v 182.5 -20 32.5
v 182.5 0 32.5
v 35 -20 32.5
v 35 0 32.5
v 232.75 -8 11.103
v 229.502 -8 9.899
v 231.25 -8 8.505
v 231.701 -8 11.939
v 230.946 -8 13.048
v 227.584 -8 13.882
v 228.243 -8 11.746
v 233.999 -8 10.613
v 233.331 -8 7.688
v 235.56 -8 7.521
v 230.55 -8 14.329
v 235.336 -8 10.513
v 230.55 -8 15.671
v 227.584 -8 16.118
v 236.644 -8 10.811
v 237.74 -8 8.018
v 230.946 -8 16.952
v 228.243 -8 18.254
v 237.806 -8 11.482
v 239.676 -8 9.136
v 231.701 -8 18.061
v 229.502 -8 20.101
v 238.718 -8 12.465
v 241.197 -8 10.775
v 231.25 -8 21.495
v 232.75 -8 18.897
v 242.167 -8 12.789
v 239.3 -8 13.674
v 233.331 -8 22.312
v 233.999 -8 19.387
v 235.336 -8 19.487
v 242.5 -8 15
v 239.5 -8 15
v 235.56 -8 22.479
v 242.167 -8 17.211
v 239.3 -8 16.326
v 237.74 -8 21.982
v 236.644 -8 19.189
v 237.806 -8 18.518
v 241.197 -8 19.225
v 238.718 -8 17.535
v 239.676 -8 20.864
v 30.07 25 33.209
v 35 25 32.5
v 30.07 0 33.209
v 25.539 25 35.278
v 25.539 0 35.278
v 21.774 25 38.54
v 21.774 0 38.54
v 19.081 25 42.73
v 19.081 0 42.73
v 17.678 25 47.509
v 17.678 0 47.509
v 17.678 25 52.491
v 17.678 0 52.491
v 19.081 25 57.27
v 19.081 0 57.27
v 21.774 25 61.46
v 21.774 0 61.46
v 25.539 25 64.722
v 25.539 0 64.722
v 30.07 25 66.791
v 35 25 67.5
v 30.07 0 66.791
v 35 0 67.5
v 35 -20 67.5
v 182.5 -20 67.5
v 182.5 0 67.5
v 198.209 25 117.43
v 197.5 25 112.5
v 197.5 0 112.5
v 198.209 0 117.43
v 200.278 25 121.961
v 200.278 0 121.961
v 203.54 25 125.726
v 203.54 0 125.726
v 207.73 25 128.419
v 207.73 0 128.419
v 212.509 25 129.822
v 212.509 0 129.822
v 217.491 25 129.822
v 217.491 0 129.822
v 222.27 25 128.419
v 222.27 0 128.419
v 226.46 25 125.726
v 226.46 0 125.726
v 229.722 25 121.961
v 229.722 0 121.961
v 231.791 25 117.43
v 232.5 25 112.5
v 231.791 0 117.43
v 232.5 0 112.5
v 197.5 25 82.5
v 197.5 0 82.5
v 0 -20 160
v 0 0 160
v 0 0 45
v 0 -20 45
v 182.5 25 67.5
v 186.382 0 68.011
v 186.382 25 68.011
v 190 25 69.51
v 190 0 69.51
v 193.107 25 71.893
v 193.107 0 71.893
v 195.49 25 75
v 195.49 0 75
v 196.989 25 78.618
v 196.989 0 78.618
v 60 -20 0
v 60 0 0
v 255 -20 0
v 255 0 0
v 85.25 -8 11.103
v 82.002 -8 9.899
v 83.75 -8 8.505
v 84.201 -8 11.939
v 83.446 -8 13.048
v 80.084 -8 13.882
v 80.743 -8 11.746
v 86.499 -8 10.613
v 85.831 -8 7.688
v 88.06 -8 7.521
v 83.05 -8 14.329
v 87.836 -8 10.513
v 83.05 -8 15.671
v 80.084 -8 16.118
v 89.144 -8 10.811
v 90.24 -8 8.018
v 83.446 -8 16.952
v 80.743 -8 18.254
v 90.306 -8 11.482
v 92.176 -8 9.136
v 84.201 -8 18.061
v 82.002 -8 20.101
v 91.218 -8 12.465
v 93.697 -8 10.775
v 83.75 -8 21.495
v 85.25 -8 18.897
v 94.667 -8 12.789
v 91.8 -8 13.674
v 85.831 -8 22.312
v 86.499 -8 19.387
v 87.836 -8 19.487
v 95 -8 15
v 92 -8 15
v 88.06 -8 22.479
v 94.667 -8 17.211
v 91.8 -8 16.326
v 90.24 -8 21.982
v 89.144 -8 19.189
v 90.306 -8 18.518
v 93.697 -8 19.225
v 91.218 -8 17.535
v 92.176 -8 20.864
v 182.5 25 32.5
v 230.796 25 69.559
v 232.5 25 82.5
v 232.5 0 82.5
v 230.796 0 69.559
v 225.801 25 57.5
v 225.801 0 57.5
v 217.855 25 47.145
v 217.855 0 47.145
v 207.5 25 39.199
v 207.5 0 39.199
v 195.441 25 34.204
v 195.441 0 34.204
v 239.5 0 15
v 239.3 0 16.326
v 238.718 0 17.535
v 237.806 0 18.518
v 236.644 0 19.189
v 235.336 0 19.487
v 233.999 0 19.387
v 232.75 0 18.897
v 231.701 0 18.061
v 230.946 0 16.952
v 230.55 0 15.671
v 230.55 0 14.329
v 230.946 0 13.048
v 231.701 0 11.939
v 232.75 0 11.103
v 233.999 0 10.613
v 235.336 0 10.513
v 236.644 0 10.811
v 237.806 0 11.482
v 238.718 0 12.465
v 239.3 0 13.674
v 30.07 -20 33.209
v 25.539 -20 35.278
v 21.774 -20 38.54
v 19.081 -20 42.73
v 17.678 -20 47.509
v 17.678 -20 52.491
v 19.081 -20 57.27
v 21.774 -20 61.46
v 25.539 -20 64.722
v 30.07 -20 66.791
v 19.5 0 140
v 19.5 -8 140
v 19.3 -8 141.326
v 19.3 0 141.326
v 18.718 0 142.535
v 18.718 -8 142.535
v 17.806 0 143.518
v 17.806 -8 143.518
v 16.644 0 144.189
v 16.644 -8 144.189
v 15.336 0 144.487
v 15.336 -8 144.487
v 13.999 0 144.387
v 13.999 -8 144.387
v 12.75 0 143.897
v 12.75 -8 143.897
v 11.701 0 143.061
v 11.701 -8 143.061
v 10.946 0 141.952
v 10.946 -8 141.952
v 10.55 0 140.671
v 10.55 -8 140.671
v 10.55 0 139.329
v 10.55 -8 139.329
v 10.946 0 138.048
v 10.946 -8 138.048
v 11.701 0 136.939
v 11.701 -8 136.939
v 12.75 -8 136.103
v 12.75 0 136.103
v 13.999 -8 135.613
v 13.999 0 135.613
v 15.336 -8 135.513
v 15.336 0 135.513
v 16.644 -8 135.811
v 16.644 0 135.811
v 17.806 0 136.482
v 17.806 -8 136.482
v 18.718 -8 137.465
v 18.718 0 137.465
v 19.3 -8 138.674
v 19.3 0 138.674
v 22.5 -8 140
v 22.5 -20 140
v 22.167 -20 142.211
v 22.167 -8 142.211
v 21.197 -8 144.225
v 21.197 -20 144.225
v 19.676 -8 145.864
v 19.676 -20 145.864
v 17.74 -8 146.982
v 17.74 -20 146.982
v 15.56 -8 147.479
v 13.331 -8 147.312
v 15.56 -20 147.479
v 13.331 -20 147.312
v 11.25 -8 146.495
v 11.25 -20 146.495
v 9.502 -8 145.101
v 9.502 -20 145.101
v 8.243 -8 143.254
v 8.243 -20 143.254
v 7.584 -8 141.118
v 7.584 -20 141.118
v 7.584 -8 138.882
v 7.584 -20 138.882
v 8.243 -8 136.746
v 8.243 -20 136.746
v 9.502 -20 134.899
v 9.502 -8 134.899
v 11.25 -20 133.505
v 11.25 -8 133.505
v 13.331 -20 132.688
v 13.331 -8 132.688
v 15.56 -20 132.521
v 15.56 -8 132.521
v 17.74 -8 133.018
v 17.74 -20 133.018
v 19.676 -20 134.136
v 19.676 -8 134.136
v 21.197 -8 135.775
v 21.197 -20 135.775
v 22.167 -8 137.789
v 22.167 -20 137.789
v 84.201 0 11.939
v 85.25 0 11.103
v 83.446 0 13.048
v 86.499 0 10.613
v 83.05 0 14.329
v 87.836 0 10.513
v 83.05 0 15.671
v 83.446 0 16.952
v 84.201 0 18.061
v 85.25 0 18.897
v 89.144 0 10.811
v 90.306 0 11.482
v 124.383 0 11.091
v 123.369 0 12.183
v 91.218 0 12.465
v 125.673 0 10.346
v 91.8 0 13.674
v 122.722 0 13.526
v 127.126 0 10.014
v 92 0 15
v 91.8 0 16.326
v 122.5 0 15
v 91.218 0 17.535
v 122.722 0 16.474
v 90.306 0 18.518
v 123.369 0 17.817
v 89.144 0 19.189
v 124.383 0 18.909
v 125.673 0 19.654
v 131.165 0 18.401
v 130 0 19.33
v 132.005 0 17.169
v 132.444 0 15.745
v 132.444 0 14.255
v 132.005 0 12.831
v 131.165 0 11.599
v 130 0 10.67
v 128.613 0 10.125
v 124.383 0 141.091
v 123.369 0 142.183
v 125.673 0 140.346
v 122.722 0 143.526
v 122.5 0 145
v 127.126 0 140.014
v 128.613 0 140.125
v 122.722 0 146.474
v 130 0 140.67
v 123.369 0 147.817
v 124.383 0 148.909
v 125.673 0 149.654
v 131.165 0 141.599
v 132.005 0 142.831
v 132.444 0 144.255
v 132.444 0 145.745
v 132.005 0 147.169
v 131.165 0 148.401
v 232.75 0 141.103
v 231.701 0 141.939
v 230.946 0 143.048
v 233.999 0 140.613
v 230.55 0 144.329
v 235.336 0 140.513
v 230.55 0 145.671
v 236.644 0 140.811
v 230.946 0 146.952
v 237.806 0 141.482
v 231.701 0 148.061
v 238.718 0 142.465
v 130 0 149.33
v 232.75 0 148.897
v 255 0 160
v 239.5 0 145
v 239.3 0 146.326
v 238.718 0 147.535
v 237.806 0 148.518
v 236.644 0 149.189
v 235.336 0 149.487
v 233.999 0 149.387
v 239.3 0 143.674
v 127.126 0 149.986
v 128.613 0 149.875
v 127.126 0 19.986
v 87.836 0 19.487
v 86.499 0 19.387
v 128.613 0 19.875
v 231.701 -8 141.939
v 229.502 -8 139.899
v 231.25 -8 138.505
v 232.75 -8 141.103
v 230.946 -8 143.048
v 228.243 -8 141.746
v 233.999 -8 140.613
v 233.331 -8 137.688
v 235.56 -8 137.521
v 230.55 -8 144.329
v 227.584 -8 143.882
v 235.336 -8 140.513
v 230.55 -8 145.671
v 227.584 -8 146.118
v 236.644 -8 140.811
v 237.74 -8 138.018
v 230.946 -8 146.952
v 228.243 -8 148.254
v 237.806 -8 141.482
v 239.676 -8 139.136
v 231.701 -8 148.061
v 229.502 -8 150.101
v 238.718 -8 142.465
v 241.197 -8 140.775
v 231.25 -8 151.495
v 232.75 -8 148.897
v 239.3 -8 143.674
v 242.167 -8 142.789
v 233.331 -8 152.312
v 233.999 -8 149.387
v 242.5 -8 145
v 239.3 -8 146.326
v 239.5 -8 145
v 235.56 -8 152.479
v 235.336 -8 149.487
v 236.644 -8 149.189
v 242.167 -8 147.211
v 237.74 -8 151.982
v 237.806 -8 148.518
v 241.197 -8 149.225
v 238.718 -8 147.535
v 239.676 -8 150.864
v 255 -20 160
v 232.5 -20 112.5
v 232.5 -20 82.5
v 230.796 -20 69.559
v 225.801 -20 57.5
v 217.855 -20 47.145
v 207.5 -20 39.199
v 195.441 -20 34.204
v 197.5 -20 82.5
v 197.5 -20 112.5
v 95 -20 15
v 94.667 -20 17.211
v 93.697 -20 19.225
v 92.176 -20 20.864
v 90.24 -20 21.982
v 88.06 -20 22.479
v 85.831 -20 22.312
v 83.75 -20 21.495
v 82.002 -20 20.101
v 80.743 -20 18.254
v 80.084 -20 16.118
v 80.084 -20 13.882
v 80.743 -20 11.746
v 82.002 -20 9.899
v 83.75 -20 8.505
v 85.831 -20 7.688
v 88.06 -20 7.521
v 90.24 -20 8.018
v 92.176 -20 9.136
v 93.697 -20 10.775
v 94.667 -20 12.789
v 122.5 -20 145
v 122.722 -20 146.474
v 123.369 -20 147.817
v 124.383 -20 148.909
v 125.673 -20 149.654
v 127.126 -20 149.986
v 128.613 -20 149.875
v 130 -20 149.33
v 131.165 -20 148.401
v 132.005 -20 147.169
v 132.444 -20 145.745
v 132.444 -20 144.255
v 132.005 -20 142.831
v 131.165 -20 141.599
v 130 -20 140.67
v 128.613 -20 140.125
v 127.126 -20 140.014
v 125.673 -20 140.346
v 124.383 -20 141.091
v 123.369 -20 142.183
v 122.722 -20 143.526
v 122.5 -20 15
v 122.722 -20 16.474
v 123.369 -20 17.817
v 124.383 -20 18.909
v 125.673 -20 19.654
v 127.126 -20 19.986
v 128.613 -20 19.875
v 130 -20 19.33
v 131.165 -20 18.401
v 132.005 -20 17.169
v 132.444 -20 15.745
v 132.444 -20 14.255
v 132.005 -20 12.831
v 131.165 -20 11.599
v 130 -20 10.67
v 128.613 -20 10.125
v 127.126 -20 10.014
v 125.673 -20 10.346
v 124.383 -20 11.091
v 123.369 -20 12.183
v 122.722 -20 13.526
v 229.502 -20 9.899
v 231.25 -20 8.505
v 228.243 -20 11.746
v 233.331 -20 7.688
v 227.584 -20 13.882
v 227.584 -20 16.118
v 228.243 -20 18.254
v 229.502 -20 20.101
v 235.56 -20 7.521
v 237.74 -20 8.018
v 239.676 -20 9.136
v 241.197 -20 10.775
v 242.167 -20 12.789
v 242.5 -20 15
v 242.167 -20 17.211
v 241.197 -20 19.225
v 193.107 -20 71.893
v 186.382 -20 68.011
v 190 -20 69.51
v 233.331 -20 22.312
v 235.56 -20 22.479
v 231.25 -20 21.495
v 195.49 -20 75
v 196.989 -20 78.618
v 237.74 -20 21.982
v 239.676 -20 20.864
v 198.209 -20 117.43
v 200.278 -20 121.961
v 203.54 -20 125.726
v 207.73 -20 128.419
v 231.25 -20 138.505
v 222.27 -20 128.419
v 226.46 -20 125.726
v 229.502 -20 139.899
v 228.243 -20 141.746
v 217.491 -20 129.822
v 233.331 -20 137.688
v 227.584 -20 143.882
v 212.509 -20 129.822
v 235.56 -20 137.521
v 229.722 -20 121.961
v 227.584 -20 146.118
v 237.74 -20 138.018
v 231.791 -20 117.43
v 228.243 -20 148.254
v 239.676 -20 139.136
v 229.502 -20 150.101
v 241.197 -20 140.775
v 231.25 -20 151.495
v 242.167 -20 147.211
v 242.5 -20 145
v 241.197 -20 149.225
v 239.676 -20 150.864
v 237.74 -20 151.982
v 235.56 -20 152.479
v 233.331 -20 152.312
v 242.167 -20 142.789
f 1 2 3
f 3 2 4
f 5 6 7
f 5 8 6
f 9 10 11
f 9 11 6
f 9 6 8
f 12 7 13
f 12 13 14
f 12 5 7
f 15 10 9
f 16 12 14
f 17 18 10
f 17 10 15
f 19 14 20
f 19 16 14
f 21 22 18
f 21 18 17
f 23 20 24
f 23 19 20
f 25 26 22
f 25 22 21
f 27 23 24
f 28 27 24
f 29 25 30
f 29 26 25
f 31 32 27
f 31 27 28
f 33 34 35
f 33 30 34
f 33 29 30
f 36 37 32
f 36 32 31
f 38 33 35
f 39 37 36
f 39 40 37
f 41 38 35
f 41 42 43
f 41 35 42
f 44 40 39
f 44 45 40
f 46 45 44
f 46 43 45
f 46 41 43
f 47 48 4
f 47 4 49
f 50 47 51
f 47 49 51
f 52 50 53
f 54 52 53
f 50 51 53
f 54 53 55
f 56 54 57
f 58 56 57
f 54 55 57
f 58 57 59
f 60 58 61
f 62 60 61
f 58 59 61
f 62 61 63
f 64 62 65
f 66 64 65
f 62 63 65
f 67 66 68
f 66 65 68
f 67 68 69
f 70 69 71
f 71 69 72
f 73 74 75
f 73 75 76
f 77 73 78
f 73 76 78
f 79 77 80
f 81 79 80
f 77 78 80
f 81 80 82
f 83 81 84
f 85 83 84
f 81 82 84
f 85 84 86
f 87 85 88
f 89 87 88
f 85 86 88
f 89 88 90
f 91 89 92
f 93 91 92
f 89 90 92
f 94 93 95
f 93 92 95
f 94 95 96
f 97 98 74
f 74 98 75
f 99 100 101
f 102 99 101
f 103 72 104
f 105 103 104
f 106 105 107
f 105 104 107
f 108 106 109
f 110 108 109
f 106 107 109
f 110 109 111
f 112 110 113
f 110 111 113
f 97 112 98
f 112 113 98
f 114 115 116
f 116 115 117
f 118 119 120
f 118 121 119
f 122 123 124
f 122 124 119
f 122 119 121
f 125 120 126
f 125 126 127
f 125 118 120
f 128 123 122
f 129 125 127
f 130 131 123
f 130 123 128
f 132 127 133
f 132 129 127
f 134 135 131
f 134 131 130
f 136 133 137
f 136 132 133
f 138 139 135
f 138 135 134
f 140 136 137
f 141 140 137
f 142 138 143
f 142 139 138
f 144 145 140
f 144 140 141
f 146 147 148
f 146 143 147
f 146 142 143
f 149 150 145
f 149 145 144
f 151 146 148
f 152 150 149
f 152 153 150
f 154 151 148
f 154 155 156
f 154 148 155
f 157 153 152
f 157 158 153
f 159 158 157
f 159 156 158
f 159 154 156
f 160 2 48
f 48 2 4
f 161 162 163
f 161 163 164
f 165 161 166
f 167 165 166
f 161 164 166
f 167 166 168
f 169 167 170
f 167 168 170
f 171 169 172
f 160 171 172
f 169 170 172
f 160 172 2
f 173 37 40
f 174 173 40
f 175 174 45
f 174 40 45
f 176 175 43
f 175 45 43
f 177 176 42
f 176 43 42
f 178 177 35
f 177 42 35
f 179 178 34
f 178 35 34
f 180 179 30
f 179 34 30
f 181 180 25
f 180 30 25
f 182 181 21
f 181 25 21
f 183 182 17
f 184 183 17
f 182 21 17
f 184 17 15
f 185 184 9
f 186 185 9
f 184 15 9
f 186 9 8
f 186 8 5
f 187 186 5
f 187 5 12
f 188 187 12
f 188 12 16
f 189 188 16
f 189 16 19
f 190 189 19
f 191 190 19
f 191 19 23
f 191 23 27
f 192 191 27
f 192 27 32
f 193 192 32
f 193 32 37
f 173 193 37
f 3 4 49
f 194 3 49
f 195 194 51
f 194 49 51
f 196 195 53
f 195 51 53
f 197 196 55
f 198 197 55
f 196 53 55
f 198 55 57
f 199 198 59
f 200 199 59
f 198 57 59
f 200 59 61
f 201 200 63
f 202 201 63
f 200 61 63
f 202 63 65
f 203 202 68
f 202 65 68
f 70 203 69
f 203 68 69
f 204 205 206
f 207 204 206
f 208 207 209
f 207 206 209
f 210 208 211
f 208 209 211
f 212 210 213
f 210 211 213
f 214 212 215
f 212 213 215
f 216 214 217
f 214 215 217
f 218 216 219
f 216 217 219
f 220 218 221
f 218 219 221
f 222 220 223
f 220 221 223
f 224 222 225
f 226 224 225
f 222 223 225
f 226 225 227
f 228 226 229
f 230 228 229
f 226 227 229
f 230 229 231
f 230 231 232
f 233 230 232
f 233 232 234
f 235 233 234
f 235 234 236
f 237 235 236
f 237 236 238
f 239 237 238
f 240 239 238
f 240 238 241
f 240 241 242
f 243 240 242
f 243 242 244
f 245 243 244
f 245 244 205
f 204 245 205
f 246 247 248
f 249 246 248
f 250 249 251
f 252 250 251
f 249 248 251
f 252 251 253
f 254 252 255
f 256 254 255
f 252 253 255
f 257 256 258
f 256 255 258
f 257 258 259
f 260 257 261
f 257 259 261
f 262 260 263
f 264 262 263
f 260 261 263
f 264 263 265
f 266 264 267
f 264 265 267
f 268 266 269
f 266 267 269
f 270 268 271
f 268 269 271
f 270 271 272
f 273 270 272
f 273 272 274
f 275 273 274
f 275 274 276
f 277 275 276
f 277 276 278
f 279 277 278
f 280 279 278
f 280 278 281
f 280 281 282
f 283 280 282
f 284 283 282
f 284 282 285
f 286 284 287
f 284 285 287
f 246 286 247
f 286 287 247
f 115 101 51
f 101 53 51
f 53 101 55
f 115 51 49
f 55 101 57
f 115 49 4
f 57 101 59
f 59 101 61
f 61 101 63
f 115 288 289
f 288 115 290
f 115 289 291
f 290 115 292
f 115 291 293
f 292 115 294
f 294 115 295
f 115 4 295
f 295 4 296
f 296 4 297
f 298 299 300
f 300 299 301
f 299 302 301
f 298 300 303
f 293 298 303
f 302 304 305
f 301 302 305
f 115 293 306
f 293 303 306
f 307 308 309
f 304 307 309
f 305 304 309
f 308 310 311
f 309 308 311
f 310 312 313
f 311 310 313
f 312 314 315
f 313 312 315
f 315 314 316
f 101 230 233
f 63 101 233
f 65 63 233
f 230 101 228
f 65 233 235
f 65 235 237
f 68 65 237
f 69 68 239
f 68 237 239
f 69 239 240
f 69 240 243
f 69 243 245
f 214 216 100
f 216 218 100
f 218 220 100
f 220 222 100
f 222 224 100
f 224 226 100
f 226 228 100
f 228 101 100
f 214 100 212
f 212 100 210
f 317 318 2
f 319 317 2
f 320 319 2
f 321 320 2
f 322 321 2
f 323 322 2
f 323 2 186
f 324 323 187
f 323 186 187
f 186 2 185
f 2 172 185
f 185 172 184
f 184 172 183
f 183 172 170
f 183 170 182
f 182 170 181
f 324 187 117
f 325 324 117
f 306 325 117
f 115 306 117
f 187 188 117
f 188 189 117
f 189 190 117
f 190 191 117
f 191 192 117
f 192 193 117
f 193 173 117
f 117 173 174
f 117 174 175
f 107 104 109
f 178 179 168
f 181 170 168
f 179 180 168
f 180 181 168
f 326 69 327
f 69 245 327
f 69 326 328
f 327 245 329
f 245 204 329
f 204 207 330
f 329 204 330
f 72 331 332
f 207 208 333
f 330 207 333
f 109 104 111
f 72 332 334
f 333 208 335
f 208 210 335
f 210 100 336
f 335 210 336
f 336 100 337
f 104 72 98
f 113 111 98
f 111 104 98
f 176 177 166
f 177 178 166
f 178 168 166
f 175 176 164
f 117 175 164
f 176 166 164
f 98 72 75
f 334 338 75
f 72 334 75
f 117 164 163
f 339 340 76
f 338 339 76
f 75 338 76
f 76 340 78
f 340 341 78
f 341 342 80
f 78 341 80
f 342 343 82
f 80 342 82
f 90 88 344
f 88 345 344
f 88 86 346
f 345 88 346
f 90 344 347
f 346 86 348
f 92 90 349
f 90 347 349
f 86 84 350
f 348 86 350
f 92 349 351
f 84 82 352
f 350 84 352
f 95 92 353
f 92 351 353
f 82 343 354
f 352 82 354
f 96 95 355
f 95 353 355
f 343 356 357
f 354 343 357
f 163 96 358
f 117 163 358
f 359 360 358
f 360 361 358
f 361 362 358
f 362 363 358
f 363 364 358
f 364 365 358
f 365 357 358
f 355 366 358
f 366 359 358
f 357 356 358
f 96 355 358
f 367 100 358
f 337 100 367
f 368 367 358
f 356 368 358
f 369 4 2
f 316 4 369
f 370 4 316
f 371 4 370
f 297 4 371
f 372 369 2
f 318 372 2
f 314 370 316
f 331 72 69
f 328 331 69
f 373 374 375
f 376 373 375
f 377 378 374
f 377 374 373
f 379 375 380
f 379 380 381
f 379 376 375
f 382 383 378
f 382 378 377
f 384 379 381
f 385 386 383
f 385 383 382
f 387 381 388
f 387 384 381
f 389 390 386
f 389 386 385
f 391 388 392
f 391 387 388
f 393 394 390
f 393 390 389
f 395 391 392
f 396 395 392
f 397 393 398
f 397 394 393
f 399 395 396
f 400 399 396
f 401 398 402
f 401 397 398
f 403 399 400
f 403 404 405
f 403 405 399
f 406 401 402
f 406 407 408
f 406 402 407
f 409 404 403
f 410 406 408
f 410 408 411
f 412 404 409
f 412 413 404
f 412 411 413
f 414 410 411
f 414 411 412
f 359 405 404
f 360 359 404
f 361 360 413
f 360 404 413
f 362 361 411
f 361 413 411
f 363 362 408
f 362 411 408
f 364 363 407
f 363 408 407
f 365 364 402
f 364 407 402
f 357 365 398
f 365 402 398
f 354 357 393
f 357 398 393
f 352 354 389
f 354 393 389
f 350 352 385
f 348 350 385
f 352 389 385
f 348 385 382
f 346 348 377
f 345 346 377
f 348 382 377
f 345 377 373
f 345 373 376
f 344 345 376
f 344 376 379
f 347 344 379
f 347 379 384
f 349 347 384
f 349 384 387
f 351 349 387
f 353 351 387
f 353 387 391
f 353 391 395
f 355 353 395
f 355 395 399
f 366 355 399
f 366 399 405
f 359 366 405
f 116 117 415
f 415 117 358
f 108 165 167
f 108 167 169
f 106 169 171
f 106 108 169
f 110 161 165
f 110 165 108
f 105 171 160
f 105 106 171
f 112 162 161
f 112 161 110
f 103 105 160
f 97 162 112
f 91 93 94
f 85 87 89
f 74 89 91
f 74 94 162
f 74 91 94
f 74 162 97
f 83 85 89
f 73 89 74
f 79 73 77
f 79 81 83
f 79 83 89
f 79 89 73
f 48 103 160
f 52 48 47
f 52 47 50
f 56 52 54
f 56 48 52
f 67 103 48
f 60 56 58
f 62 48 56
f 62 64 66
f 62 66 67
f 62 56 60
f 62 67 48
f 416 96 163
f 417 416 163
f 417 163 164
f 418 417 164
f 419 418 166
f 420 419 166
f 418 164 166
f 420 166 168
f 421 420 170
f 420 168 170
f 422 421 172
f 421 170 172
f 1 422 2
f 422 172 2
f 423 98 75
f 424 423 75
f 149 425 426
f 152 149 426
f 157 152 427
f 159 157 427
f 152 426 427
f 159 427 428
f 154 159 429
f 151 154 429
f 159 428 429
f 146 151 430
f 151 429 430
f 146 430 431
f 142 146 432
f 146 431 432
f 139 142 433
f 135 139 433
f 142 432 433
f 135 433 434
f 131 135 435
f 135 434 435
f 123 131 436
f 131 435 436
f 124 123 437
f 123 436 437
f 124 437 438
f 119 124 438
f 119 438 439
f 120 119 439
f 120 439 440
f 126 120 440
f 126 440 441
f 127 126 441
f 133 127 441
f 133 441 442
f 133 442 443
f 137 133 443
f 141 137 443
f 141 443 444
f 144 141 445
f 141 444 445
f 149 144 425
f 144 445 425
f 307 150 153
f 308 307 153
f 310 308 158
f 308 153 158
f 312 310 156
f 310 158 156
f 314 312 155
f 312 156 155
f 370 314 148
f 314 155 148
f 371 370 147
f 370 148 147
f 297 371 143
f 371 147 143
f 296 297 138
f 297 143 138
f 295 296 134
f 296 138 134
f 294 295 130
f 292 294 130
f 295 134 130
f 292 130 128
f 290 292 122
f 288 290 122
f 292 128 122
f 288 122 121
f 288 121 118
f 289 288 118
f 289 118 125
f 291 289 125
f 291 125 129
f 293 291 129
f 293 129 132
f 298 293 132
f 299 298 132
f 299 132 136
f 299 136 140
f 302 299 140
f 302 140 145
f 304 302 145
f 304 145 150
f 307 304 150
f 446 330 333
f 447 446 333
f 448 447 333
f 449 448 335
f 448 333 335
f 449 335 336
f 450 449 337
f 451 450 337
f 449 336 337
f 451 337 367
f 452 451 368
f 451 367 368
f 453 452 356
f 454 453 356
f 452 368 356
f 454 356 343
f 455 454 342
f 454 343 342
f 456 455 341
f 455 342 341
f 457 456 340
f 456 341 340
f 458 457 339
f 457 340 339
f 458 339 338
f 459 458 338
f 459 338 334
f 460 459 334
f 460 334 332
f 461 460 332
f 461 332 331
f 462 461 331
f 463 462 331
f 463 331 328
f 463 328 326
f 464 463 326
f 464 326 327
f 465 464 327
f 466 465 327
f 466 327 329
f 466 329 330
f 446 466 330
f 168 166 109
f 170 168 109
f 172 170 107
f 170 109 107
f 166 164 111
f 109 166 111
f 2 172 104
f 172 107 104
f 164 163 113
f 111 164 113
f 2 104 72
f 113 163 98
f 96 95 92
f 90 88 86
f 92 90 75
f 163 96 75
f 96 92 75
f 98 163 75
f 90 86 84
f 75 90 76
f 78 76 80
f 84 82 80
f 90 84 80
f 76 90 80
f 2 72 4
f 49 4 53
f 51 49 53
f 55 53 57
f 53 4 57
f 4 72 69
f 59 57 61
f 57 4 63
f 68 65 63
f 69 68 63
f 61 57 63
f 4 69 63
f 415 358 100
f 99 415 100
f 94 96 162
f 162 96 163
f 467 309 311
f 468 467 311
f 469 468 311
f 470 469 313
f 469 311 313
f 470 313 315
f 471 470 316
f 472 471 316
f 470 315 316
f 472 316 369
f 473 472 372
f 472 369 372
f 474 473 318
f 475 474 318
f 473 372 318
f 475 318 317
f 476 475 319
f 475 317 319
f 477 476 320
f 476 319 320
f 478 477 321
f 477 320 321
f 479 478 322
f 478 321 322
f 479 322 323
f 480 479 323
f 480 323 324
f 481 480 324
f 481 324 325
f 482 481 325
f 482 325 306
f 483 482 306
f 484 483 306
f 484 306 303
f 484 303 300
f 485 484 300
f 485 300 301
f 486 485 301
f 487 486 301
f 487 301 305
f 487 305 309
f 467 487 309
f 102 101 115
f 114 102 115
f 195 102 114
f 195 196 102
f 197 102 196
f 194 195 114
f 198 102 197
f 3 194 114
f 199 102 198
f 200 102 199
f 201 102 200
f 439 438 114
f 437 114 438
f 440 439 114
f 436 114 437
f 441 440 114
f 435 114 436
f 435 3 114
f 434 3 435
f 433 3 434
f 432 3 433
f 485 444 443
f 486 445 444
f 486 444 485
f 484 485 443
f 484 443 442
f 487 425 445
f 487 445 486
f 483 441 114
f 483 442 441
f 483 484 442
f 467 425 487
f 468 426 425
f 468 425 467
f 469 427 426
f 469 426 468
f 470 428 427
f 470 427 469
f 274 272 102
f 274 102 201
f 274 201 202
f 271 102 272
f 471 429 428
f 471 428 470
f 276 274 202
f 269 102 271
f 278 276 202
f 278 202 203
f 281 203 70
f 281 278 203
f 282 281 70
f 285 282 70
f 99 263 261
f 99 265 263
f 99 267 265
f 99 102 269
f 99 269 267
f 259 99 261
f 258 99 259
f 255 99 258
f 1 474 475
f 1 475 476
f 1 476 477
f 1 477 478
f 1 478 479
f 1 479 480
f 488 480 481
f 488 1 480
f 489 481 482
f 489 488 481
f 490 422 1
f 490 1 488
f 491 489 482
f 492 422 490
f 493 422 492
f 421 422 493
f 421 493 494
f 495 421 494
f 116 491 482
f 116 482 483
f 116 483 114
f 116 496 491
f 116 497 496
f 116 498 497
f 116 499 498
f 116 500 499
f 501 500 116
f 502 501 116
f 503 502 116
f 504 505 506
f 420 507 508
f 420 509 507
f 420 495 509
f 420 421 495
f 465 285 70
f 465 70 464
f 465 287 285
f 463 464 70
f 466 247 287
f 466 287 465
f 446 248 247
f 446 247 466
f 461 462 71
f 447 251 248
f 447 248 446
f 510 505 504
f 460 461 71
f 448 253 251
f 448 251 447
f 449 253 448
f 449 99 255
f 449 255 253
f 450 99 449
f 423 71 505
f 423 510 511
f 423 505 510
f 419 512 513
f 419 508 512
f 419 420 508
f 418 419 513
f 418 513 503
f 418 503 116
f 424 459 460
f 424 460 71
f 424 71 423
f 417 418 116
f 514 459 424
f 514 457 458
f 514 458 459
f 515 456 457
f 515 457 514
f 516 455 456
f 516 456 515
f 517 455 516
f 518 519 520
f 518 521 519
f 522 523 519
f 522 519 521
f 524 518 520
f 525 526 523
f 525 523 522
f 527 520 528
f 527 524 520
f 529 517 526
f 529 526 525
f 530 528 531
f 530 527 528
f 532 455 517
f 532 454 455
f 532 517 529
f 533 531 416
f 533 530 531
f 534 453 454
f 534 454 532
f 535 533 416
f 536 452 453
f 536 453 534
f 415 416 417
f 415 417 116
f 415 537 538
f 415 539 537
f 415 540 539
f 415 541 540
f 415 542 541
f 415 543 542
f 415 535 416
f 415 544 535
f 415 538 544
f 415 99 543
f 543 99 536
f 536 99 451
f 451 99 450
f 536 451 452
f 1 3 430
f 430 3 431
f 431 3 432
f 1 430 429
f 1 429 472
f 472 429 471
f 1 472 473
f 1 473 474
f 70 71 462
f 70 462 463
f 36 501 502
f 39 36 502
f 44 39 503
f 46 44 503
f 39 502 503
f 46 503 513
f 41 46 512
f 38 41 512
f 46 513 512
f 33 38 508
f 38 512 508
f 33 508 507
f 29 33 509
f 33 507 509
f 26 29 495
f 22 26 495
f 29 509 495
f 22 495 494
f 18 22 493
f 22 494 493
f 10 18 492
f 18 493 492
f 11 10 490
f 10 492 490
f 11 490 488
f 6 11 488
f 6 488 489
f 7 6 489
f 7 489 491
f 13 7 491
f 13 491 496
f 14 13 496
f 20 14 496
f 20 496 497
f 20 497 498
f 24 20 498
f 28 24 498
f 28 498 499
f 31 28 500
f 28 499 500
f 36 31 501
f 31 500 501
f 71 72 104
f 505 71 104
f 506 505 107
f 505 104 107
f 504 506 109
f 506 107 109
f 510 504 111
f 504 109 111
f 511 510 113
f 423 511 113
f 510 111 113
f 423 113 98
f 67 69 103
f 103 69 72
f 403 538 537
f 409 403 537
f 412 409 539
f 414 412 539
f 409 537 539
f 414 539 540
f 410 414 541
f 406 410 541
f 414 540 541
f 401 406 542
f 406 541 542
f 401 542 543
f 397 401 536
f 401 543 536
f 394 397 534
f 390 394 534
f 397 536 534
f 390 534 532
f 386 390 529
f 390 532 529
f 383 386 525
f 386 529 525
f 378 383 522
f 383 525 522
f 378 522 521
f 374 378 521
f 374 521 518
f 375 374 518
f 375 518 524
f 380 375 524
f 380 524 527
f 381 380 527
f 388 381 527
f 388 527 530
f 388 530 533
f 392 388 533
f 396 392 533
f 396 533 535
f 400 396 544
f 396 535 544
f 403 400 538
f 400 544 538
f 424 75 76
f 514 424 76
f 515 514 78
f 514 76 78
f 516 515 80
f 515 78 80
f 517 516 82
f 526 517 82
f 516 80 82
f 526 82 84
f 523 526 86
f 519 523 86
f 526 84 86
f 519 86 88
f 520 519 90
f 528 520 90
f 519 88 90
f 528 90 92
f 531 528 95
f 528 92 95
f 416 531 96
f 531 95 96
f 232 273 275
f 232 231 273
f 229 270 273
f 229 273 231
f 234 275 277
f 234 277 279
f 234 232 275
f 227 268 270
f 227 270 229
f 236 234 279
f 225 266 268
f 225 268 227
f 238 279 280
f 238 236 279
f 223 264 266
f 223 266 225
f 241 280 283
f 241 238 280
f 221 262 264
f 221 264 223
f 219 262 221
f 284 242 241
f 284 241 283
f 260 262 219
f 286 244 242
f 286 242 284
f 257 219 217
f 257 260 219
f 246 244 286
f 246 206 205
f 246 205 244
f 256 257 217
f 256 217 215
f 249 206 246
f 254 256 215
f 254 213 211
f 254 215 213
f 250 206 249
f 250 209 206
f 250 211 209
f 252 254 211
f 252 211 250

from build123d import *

# Parameters (mm, degrees)
F1_DEPTH = 20
F2_R     = 4.5
F3_DEPTH = 20.001
F2_R_2   = 7.5
F4_DEPTH = 12
F5_D     = 10
F7_DEPTH = 25


with BuildPart() as f1:
    # F0 (on Front) → F1 (new body)
    with BuildSketch(Plane.XZ):
        Polygon((0, 45), (60, 0), (255, 0), (255, 160), (0, 160), align=None)
        with BuildLine():
            ThreePointArc((35, 32.5), (17.5, 50), (35, 67.5))
            Line((35, 67.5), (182.5, 67.5))
            ThreePointArc((182.5, 67.5), (193.106602, 71.893398), (197.5, 82.5))
            Line((197.5, 82.5), (197.5, 112.5))
            ThreePointArc((197.5, 112.5), (215, 130), (232.5, 112.5))
            Line((232.5, 112.5), (232.5, 82.5))
            ThreePointArc((232.5, 82.5), (217.855339, 47.144661), (182.5, 32.5))
            Line((182.5, 32.5), (35, 32.5))
        make_face(mode=Mode.SUBTRACT)
    extrude(amount=F1_DEPTH)

    # F2 (on face) → F3 (cut, through all)
    with BuildSketch(Plane.XZ.offset(20)):
        with Locations((15, 140)):
            Circle(F2_R)
        with Locations((235, 145)):
            Circle(F2_R)
        with Locations((235, 15)):
            Circle(F2_R)
        with Locations((87.5, 15)):
            Circle(F2_R)
    extrude(amount=-F3_DEPTH, mode=Mode.SUBTRACT)

    # F2 (on face) → F4 (cut)
    with BuildSketch(Plane.XZ.offset(20)):
        with Locations((15, 140)):
            Circle(F2_R_2)
        with Locations((15, 140)):
            Circle(F2_R, mode=Mode.SUBTRACT)
        with Locations((235, 145)):
            Circle(F2_R_2)
        with Locations((235, 145)):
            Circle(F2_R, mode=Mode.SUBTRACT)
        with Locations((235, 15)):
            Circle(F2_R_2)
        with Locations((235, 15)):
            Circle(F2_R, mode=Mode.SUBTRACT)
        with Locations((87.5, 15)):
            Circle(F2_R_2)
        with Locations((87.5, 15)):
            Circle(F2_R, mode=Mode.SUBTRACT)
    extrude(amount=-F4_DEPTH, mode=Mode.SUBTRACT)

    # F5 (through all)
    with Locations(Plane.XZ.offset(20)):
        with Locations((127.5, 145), (127.5, 15)):
            Hole(F5_D / 2)


with BuildPart() as f7:
    # F6 (on face) → F7 (new body)
    with BuildSketch(Plane(origin=(0, 0, 0), x_dir=(-1, 0, 0), z_dir=(0, 1, 0))):
        with BuildLine():
            ThreePointArc((-35, 32.5), (-17.5, 50), (-35, 67.5))
            Line((-35, 67.5), (-182.5, 67.5))
            ThreePointArc((-182.5, 67.5), (-193.106602, 71.893398), (-197.5, 82.5))
            Line((-197.5, 82.5), (-197.5, 112.5))
            ThreePointArc((-197.5, 112.5), (-215, 130), (-232.5, 112.5))
            Line((-232.5, 112.5), (-232.5, 82.5))
            ThreePointArc((-232.5, 82.5), (-217.855339, 47.144661), (-182.5, 32.5))
            Line((-182.5, 32.5), (-35, 32.5))
        make_face()
    extrude(amount=F7_DEPTH)


solid = Compound([f1.part, f7.part])
